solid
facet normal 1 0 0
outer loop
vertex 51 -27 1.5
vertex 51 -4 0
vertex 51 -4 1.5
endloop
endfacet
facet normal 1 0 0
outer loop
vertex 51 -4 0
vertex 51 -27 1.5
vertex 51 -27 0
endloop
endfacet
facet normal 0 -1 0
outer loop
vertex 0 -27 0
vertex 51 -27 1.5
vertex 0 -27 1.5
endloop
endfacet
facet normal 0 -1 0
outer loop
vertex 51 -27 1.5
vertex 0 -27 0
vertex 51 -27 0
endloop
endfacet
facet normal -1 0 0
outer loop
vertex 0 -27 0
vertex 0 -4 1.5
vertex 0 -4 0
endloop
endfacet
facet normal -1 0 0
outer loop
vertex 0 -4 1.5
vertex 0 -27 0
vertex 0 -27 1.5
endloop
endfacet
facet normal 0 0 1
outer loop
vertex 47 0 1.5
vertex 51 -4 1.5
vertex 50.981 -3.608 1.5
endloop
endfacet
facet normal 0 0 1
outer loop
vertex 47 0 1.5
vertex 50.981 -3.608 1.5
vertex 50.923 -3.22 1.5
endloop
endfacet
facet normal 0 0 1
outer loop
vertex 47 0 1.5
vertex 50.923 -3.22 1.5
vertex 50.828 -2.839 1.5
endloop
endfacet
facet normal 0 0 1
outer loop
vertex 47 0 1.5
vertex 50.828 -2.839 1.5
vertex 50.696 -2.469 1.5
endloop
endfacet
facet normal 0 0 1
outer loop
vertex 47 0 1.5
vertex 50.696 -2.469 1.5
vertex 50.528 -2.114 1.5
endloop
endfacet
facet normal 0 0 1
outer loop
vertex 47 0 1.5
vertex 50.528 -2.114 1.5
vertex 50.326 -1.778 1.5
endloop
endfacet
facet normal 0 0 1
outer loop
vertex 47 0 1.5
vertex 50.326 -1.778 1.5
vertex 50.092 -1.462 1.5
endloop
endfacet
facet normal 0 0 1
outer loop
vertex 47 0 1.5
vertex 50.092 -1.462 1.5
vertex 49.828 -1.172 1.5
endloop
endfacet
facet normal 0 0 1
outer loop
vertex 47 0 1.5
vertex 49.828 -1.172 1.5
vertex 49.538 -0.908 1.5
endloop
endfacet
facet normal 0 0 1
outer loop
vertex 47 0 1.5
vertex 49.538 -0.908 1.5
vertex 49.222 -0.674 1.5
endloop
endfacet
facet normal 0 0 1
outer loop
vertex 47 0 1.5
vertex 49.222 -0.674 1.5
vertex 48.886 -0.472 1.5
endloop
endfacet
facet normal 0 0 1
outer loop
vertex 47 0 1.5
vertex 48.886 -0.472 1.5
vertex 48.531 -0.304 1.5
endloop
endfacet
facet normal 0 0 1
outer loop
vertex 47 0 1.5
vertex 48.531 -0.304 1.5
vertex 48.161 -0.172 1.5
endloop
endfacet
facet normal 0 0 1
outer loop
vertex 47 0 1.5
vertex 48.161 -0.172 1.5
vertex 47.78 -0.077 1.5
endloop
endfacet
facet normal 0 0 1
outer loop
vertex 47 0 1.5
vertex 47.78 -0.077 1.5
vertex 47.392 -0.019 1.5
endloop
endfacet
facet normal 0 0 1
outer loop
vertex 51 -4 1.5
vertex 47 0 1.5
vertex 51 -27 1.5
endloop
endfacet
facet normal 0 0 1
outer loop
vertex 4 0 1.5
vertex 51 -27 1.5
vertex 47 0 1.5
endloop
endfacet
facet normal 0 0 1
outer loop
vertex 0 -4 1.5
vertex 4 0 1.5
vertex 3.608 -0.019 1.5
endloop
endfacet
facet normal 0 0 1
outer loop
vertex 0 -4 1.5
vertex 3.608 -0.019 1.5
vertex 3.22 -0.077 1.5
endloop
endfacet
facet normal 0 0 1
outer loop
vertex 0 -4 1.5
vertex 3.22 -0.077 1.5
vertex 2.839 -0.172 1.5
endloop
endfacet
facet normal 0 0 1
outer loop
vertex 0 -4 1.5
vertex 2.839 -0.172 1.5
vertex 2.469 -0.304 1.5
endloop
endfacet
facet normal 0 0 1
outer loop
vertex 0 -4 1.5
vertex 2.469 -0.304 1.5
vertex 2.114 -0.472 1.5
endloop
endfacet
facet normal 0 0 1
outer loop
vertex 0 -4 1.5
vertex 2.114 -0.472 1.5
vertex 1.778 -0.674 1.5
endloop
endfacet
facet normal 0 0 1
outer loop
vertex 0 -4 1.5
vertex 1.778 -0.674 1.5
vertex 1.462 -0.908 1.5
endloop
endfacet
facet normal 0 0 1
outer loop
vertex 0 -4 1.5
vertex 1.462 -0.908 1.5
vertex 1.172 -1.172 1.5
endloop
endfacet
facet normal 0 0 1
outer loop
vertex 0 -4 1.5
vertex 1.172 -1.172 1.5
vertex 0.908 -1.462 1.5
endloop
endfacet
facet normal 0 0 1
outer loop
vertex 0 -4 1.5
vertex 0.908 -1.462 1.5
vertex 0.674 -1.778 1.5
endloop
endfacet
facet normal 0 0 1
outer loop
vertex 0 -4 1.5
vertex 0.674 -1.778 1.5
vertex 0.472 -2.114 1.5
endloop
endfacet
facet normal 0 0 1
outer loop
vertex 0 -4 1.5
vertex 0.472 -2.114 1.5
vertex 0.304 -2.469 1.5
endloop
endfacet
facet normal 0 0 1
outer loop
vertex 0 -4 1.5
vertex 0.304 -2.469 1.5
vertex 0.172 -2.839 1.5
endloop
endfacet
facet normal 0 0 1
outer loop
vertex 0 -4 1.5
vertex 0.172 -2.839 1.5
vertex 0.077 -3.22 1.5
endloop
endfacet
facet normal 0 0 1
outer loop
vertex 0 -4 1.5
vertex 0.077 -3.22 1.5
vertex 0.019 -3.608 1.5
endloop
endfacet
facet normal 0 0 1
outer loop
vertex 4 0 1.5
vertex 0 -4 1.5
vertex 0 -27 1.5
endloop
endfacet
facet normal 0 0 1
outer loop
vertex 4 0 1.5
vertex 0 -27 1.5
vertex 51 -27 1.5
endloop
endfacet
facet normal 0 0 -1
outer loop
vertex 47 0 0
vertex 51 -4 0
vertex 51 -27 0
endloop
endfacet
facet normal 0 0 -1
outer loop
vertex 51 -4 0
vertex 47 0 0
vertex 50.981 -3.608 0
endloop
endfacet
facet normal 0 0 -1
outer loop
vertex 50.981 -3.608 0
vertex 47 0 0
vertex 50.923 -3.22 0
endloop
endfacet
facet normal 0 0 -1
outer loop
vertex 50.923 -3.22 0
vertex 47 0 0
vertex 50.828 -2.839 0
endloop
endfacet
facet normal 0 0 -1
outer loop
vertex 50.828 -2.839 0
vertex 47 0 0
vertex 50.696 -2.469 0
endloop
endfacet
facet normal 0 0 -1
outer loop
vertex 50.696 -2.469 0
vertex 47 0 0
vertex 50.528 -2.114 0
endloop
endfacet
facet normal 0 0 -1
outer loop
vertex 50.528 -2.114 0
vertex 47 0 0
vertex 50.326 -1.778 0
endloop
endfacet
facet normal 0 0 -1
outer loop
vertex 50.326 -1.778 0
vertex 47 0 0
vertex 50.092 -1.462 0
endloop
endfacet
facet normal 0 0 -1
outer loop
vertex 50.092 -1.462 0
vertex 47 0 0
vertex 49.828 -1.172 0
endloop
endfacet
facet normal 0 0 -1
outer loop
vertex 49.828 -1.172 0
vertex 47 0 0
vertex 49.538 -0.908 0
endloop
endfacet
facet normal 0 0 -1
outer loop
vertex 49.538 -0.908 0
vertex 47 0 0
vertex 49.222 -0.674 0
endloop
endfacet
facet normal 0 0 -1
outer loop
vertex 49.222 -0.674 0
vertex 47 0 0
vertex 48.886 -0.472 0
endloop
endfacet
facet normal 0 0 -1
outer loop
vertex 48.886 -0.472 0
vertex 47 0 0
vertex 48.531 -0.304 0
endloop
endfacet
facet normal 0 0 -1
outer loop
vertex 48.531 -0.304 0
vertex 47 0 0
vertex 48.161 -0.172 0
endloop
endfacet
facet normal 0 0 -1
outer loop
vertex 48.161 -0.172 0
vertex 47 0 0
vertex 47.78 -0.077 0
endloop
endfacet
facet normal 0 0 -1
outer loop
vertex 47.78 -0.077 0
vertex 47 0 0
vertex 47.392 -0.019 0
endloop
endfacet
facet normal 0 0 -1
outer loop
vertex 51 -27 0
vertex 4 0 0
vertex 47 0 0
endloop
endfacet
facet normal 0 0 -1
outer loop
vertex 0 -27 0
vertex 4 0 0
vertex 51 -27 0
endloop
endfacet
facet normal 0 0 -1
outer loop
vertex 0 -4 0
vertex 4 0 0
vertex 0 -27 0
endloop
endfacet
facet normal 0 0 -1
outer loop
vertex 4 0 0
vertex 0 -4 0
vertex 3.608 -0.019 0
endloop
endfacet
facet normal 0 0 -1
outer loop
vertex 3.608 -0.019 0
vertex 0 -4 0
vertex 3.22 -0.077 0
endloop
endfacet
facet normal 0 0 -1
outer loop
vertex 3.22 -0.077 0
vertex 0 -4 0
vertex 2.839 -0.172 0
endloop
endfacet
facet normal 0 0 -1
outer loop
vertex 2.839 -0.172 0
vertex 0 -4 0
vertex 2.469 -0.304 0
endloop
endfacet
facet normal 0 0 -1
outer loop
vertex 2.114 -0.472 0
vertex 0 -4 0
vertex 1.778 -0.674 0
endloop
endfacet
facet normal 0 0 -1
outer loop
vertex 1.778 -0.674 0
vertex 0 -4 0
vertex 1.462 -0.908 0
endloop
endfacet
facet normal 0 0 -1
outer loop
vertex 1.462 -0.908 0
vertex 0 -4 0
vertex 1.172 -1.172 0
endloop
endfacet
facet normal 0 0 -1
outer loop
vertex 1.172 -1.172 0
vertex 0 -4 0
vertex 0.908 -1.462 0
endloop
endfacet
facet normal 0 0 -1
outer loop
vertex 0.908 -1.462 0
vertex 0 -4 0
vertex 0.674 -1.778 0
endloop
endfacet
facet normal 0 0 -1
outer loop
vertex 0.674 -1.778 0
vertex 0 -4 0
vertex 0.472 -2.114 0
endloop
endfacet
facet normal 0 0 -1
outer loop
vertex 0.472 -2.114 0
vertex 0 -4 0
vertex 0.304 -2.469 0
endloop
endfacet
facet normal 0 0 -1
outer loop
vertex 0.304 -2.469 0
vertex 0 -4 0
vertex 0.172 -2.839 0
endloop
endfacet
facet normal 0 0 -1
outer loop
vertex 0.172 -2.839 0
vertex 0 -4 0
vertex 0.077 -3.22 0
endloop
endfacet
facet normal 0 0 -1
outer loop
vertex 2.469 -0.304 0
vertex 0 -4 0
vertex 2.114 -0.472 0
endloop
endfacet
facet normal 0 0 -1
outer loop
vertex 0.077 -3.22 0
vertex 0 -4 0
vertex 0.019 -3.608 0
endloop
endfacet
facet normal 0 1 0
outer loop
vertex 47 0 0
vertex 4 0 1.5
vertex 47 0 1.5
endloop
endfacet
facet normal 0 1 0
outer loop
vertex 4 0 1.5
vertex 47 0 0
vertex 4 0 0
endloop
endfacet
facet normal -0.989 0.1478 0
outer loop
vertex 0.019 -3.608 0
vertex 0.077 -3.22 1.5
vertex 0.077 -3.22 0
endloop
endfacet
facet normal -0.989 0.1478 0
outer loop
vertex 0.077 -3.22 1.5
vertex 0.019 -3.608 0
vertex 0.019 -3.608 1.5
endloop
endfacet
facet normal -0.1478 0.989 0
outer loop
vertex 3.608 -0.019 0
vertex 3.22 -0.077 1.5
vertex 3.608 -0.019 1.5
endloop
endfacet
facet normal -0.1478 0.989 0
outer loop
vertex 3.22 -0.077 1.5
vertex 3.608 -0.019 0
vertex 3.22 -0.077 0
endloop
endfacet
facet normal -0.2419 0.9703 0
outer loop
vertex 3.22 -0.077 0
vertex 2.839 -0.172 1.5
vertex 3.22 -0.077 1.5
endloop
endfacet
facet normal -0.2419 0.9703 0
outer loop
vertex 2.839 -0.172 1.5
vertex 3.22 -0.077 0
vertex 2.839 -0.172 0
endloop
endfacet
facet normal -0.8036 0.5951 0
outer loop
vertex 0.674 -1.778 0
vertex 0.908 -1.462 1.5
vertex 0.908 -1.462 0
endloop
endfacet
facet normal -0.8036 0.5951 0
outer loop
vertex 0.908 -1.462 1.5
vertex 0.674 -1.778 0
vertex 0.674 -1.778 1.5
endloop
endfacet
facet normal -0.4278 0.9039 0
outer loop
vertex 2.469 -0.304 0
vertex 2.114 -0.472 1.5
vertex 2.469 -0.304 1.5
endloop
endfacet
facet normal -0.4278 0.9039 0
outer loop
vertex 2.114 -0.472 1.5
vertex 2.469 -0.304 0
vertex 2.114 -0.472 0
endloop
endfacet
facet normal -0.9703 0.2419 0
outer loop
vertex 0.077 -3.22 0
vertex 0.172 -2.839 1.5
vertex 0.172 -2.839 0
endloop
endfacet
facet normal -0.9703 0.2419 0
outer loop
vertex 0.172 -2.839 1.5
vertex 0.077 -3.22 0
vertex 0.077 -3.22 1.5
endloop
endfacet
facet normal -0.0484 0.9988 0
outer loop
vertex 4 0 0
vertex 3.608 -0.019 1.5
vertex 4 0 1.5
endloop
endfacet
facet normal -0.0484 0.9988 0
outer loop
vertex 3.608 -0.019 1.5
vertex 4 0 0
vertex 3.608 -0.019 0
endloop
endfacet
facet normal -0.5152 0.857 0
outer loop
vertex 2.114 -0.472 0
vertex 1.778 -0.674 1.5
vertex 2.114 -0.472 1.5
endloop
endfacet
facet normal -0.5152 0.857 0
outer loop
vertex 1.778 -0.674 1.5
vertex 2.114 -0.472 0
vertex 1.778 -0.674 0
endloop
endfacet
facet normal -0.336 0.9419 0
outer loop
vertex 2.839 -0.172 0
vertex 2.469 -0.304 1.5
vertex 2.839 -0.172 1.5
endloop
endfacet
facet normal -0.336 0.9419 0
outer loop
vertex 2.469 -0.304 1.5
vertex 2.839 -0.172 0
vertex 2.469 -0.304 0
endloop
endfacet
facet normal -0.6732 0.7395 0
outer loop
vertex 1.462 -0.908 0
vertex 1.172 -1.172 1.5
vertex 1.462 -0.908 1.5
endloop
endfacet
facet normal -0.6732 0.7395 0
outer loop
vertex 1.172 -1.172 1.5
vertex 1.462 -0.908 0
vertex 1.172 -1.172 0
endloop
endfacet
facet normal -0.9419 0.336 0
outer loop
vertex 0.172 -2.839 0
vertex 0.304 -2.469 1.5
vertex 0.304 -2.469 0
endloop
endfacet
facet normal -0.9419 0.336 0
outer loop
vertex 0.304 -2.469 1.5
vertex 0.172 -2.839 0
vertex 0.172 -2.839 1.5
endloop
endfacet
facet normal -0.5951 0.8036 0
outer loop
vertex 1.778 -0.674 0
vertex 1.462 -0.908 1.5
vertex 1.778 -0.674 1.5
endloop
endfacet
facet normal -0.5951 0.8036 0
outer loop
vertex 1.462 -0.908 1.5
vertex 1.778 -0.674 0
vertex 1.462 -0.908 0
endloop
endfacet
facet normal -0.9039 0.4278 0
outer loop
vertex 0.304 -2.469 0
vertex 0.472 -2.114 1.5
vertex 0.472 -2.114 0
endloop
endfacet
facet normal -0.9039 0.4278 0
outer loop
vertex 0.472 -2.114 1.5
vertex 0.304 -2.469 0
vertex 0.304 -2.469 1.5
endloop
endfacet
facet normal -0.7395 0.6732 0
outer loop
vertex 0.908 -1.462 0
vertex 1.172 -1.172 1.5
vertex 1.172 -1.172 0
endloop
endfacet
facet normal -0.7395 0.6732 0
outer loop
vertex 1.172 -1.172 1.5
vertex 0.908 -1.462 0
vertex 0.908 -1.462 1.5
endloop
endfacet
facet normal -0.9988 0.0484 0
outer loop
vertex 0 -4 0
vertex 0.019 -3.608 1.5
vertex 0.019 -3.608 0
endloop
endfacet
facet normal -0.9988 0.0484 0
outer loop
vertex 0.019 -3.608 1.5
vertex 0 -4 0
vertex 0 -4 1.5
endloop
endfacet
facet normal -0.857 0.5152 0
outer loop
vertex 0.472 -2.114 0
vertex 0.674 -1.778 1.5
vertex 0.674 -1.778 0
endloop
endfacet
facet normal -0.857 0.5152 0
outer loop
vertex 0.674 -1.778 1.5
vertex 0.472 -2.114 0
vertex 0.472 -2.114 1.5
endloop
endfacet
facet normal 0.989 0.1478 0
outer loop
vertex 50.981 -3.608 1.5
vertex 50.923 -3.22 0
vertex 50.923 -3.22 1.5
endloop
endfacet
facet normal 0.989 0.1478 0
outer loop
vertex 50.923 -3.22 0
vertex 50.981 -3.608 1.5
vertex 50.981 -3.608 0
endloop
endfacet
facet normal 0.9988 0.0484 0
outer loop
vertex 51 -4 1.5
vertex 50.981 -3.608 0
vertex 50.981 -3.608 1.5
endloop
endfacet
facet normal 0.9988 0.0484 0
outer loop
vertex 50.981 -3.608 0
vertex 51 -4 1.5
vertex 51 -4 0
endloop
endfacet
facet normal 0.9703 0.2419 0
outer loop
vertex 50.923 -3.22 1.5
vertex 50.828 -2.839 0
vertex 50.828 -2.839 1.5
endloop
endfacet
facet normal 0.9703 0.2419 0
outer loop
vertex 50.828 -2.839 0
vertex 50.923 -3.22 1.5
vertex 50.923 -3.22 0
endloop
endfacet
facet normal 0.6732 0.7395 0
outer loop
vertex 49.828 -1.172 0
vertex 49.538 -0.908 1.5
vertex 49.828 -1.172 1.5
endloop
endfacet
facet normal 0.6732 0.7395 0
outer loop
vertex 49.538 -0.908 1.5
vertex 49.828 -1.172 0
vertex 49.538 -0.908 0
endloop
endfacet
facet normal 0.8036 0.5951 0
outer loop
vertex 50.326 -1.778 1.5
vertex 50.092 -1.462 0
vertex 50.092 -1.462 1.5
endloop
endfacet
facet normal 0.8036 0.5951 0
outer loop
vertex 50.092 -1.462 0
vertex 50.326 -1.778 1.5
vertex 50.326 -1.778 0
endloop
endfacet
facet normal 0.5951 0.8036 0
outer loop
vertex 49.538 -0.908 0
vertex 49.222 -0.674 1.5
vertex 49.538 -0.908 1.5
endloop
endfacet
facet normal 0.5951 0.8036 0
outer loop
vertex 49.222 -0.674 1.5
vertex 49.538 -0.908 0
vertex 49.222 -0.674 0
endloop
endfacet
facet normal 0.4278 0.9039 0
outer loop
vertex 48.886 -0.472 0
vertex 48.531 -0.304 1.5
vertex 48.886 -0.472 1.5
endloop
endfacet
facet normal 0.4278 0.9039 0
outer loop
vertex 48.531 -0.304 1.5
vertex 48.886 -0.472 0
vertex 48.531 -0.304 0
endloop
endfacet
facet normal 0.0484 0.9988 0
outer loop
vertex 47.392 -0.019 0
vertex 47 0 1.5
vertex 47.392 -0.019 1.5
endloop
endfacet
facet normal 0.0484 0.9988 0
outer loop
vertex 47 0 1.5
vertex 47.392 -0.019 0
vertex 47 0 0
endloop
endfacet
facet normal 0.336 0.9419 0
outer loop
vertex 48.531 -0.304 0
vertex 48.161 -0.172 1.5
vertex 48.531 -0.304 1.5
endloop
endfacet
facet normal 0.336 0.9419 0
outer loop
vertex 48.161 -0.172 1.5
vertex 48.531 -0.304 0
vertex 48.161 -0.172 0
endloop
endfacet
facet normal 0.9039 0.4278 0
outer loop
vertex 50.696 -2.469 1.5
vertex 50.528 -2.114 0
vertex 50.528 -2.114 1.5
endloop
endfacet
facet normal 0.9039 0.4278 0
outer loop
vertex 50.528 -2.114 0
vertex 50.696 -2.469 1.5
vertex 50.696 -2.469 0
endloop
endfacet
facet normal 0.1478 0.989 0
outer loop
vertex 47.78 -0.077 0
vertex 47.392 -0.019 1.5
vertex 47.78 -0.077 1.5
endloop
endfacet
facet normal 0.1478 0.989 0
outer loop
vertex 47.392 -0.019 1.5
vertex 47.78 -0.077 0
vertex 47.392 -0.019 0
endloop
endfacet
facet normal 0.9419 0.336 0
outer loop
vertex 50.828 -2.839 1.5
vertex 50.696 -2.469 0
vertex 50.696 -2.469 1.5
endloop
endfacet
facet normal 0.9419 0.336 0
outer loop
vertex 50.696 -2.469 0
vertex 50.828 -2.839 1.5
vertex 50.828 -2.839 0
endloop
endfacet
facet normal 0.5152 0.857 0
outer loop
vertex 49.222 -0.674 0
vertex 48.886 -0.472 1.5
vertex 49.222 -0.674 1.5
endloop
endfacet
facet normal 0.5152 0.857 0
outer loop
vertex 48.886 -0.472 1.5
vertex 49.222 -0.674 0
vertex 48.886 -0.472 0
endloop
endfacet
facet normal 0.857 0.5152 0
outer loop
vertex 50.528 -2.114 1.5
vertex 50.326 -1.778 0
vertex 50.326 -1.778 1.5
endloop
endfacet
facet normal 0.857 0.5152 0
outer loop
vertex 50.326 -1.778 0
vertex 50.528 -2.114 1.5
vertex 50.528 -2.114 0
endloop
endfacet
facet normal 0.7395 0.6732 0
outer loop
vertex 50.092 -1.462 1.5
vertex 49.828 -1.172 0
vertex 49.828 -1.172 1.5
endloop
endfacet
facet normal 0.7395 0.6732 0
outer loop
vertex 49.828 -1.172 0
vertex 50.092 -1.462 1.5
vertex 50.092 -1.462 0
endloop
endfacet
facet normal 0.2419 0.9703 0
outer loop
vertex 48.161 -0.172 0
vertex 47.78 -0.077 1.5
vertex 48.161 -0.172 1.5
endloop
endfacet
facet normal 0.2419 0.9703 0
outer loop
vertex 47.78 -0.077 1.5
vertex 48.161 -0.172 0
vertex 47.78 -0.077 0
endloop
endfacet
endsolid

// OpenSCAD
$fn = 64;

dx = 51;
dy =  1.5;
dz = 27;

r = 4;

rotate([90, 0, 0]) {
  translate([0, 0, r])
    cube([dx, dy, dz - r]);
  translate([r, 0, 0])
    cube([dx - r - r, dy, r]);
  translate([r, 0, r])
    rotate([-90, 0, 0])
      cylinder(r = r, h = dy);
  translate([dx - r, 0, r])
    rotate([-90, 0, 0])
      cylinder(r = r, h = dy);
}
